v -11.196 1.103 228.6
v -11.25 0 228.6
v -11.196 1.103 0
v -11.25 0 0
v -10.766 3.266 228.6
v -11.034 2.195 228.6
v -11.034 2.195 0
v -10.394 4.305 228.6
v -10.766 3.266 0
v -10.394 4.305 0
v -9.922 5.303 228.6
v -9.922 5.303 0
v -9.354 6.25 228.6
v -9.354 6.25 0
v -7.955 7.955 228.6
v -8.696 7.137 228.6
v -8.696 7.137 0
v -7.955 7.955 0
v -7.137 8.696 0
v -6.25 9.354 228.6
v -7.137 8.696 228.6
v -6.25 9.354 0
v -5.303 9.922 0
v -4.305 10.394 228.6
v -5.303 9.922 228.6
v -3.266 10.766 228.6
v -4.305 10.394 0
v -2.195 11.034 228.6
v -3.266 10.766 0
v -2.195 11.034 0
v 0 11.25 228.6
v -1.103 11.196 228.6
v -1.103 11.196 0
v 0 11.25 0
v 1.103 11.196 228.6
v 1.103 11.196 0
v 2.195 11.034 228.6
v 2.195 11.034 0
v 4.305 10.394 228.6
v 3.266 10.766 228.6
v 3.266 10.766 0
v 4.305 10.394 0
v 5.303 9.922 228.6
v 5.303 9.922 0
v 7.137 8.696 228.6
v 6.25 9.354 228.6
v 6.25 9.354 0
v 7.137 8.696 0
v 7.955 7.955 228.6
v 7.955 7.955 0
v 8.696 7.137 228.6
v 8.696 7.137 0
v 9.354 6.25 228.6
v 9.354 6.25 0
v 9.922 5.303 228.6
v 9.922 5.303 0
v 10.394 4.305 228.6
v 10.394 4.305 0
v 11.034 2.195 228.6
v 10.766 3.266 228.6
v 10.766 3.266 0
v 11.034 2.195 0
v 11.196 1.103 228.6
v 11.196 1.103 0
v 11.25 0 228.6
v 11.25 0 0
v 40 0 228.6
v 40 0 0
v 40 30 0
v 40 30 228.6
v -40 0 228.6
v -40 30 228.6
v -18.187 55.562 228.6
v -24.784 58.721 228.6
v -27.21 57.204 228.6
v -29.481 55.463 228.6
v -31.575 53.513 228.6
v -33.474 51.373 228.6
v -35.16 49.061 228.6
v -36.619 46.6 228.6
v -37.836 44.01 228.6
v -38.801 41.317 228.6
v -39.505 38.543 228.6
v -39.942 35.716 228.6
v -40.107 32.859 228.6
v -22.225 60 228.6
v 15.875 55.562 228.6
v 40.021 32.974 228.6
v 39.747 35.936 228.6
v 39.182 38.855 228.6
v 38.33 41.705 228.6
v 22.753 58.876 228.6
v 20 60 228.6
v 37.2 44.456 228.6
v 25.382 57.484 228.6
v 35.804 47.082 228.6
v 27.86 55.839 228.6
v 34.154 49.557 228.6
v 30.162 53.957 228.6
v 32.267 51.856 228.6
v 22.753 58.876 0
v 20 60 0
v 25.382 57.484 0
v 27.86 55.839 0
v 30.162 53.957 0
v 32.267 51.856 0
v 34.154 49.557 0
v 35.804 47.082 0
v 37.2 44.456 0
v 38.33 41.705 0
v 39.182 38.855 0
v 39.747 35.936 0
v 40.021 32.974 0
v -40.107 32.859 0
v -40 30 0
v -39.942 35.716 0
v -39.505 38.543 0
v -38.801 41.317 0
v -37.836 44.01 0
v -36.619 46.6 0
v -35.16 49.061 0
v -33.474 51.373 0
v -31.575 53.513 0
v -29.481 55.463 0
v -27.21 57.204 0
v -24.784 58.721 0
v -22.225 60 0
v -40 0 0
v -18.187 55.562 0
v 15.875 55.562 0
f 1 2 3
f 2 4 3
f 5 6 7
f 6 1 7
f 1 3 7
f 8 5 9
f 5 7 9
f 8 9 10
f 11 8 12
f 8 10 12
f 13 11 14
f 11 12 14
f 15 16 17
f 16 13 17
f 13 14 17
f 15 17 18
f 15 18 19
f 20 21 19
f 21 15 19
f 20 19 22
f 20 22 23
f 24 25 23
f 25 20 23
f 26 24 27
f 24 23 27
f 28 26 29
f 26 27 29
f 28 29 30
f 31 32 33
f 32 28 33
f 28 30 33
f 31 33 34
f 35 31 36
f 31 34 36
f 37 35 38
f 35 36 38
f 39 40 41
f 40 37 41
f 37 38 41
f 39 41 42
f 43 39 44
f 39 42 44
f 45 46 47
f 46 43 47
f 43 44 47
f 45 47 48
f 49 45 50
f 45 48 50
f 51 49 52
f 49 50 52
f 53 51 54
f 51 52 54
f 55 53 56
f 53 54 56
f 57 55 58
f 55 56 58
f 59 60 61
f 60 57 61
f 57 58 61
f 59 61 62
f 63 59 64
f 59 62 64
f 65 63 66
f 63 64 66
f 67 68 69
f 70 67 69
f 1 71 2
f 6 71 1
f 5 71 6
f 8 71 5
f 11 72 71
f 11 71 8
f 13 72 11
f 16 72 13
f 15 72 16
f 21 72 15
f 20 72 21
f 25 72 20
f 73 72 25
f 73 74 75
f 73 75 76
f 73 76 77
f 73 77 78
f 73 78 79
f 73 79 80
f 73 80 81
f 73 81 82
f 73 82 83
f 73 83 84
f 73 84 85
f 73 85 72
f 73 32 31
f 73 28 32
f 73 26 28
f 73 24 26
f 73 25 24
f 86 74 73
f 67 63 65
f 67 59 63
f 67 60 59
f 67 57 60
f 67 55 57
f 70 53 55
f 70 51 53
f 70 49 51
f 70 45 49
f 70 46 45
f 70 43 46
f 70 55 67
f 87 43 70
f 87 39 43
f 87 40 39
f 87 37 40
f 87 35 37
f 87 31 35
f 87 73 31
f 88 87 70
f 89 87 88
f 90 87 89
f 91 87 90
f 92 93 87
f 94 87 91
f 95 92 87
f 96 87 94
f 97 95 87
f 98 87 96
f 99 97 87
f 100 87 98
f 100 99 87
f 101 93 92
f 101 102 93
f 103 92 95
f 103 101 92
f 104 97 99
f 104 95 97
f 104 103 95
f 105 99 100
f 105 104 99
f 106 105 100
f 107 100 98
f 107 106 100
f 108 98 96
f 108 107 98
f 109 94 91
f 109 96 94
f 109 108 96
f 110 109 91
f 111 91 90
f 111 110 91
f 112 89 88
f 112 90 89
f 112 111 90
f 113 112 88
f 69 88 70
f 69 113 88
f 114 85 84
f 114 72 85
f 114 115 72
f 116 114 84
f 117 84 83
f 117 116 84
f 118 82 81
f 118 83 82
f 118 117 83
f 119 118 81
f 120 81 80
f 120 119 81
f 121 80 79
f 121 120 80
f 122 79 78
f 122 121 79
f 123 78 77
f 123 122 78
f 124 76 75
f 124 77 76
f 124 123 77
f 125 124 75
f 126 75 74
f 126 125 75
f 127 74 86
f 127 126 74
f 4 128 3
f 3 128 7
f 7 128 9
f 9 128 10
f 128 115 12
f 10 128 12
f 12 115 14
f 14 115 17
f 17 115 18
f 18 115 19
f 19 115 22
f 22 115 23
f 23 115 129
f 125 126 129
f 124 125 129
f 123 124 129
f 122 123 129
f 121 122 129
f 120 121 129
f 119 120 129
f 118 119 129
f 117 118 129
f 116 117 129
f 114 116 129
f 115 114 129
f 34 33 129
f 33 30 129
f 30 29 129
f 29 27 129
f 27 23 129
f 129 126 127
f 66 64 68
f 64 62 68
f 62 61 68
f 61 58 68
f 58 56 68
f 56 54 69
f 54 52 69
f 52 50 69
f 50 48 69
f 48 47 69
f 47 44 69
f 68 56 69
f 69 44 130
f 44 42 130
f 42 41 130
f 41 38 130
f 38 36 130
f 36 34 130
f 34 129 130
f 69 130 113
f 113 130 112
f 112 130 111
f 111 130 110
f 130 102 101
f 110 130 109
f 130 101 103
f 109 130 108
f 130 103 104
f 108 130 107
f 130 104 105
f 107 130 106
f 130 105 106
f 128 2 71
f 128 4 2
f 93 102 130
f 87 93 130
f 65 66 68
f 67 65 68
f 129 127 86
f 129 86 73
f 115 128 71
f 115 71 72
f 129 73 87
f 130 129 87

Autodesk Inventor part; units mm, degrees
ref_plane "YZ Plane" through (0, 0, 0) normal (1, 0, 0) x (0, 1, 0)
ref_plane "XZ Plane" through (0, 0, 0) normal (0, 1, 0) x (-1, 0, 0)
ref_plane "XY Plane" through (0, 0, 0) normal (0, 0, 1) x (1, 0, 0)
sketch "Sketch1" plane through (0, 0, 0) normal (0, 0, 1) x (1, 0, 0)
  line L0 (0, 0) -> (40, 0)
  line L1 (40, 0) -> (40, 30)
  line L2 (0, 0) -> (-40, 0)
  line L3 (-40, 0) -> (-40, 30)
  arc A0 (-22.225, 60) -> (-40, 30) centre (-10.109, 32.5554) ccw
  arc A1 (40, 30) -> (20, 60) centre (10.0481, 31.6988) ccw
  line L4 (-22.225, 60) -> (-18.1866, 55.5625)
  line L5 (20, 60) -> (15.875, 55.5625)
  line L6 (-18.1866, 55.5625) -> (15.875, 55.5625)
  circle A2 centre (0, 0) radius 11.25
  point P0 (0, 20)
  point P1 (-11.25, 0)
  point P2 (11.25, 0)
  dimension "d0" = 40
  dimension "d1" = 30
  dimension "d2" = 40
  dimension "d3" = 30
  dimension "d4" = 30
  dimension "d5" = 60
  dimension "d7" = 6
  dimension "d9" = 20
  dimension "d10" = 22.5
extrude "Extrusion1" add sketch "Sketch1" along normal blind 228.6 contours A2 L2 L3 A0 L4 L6 L5 A1 L1 L0
properties part number "arm rest final 1"
